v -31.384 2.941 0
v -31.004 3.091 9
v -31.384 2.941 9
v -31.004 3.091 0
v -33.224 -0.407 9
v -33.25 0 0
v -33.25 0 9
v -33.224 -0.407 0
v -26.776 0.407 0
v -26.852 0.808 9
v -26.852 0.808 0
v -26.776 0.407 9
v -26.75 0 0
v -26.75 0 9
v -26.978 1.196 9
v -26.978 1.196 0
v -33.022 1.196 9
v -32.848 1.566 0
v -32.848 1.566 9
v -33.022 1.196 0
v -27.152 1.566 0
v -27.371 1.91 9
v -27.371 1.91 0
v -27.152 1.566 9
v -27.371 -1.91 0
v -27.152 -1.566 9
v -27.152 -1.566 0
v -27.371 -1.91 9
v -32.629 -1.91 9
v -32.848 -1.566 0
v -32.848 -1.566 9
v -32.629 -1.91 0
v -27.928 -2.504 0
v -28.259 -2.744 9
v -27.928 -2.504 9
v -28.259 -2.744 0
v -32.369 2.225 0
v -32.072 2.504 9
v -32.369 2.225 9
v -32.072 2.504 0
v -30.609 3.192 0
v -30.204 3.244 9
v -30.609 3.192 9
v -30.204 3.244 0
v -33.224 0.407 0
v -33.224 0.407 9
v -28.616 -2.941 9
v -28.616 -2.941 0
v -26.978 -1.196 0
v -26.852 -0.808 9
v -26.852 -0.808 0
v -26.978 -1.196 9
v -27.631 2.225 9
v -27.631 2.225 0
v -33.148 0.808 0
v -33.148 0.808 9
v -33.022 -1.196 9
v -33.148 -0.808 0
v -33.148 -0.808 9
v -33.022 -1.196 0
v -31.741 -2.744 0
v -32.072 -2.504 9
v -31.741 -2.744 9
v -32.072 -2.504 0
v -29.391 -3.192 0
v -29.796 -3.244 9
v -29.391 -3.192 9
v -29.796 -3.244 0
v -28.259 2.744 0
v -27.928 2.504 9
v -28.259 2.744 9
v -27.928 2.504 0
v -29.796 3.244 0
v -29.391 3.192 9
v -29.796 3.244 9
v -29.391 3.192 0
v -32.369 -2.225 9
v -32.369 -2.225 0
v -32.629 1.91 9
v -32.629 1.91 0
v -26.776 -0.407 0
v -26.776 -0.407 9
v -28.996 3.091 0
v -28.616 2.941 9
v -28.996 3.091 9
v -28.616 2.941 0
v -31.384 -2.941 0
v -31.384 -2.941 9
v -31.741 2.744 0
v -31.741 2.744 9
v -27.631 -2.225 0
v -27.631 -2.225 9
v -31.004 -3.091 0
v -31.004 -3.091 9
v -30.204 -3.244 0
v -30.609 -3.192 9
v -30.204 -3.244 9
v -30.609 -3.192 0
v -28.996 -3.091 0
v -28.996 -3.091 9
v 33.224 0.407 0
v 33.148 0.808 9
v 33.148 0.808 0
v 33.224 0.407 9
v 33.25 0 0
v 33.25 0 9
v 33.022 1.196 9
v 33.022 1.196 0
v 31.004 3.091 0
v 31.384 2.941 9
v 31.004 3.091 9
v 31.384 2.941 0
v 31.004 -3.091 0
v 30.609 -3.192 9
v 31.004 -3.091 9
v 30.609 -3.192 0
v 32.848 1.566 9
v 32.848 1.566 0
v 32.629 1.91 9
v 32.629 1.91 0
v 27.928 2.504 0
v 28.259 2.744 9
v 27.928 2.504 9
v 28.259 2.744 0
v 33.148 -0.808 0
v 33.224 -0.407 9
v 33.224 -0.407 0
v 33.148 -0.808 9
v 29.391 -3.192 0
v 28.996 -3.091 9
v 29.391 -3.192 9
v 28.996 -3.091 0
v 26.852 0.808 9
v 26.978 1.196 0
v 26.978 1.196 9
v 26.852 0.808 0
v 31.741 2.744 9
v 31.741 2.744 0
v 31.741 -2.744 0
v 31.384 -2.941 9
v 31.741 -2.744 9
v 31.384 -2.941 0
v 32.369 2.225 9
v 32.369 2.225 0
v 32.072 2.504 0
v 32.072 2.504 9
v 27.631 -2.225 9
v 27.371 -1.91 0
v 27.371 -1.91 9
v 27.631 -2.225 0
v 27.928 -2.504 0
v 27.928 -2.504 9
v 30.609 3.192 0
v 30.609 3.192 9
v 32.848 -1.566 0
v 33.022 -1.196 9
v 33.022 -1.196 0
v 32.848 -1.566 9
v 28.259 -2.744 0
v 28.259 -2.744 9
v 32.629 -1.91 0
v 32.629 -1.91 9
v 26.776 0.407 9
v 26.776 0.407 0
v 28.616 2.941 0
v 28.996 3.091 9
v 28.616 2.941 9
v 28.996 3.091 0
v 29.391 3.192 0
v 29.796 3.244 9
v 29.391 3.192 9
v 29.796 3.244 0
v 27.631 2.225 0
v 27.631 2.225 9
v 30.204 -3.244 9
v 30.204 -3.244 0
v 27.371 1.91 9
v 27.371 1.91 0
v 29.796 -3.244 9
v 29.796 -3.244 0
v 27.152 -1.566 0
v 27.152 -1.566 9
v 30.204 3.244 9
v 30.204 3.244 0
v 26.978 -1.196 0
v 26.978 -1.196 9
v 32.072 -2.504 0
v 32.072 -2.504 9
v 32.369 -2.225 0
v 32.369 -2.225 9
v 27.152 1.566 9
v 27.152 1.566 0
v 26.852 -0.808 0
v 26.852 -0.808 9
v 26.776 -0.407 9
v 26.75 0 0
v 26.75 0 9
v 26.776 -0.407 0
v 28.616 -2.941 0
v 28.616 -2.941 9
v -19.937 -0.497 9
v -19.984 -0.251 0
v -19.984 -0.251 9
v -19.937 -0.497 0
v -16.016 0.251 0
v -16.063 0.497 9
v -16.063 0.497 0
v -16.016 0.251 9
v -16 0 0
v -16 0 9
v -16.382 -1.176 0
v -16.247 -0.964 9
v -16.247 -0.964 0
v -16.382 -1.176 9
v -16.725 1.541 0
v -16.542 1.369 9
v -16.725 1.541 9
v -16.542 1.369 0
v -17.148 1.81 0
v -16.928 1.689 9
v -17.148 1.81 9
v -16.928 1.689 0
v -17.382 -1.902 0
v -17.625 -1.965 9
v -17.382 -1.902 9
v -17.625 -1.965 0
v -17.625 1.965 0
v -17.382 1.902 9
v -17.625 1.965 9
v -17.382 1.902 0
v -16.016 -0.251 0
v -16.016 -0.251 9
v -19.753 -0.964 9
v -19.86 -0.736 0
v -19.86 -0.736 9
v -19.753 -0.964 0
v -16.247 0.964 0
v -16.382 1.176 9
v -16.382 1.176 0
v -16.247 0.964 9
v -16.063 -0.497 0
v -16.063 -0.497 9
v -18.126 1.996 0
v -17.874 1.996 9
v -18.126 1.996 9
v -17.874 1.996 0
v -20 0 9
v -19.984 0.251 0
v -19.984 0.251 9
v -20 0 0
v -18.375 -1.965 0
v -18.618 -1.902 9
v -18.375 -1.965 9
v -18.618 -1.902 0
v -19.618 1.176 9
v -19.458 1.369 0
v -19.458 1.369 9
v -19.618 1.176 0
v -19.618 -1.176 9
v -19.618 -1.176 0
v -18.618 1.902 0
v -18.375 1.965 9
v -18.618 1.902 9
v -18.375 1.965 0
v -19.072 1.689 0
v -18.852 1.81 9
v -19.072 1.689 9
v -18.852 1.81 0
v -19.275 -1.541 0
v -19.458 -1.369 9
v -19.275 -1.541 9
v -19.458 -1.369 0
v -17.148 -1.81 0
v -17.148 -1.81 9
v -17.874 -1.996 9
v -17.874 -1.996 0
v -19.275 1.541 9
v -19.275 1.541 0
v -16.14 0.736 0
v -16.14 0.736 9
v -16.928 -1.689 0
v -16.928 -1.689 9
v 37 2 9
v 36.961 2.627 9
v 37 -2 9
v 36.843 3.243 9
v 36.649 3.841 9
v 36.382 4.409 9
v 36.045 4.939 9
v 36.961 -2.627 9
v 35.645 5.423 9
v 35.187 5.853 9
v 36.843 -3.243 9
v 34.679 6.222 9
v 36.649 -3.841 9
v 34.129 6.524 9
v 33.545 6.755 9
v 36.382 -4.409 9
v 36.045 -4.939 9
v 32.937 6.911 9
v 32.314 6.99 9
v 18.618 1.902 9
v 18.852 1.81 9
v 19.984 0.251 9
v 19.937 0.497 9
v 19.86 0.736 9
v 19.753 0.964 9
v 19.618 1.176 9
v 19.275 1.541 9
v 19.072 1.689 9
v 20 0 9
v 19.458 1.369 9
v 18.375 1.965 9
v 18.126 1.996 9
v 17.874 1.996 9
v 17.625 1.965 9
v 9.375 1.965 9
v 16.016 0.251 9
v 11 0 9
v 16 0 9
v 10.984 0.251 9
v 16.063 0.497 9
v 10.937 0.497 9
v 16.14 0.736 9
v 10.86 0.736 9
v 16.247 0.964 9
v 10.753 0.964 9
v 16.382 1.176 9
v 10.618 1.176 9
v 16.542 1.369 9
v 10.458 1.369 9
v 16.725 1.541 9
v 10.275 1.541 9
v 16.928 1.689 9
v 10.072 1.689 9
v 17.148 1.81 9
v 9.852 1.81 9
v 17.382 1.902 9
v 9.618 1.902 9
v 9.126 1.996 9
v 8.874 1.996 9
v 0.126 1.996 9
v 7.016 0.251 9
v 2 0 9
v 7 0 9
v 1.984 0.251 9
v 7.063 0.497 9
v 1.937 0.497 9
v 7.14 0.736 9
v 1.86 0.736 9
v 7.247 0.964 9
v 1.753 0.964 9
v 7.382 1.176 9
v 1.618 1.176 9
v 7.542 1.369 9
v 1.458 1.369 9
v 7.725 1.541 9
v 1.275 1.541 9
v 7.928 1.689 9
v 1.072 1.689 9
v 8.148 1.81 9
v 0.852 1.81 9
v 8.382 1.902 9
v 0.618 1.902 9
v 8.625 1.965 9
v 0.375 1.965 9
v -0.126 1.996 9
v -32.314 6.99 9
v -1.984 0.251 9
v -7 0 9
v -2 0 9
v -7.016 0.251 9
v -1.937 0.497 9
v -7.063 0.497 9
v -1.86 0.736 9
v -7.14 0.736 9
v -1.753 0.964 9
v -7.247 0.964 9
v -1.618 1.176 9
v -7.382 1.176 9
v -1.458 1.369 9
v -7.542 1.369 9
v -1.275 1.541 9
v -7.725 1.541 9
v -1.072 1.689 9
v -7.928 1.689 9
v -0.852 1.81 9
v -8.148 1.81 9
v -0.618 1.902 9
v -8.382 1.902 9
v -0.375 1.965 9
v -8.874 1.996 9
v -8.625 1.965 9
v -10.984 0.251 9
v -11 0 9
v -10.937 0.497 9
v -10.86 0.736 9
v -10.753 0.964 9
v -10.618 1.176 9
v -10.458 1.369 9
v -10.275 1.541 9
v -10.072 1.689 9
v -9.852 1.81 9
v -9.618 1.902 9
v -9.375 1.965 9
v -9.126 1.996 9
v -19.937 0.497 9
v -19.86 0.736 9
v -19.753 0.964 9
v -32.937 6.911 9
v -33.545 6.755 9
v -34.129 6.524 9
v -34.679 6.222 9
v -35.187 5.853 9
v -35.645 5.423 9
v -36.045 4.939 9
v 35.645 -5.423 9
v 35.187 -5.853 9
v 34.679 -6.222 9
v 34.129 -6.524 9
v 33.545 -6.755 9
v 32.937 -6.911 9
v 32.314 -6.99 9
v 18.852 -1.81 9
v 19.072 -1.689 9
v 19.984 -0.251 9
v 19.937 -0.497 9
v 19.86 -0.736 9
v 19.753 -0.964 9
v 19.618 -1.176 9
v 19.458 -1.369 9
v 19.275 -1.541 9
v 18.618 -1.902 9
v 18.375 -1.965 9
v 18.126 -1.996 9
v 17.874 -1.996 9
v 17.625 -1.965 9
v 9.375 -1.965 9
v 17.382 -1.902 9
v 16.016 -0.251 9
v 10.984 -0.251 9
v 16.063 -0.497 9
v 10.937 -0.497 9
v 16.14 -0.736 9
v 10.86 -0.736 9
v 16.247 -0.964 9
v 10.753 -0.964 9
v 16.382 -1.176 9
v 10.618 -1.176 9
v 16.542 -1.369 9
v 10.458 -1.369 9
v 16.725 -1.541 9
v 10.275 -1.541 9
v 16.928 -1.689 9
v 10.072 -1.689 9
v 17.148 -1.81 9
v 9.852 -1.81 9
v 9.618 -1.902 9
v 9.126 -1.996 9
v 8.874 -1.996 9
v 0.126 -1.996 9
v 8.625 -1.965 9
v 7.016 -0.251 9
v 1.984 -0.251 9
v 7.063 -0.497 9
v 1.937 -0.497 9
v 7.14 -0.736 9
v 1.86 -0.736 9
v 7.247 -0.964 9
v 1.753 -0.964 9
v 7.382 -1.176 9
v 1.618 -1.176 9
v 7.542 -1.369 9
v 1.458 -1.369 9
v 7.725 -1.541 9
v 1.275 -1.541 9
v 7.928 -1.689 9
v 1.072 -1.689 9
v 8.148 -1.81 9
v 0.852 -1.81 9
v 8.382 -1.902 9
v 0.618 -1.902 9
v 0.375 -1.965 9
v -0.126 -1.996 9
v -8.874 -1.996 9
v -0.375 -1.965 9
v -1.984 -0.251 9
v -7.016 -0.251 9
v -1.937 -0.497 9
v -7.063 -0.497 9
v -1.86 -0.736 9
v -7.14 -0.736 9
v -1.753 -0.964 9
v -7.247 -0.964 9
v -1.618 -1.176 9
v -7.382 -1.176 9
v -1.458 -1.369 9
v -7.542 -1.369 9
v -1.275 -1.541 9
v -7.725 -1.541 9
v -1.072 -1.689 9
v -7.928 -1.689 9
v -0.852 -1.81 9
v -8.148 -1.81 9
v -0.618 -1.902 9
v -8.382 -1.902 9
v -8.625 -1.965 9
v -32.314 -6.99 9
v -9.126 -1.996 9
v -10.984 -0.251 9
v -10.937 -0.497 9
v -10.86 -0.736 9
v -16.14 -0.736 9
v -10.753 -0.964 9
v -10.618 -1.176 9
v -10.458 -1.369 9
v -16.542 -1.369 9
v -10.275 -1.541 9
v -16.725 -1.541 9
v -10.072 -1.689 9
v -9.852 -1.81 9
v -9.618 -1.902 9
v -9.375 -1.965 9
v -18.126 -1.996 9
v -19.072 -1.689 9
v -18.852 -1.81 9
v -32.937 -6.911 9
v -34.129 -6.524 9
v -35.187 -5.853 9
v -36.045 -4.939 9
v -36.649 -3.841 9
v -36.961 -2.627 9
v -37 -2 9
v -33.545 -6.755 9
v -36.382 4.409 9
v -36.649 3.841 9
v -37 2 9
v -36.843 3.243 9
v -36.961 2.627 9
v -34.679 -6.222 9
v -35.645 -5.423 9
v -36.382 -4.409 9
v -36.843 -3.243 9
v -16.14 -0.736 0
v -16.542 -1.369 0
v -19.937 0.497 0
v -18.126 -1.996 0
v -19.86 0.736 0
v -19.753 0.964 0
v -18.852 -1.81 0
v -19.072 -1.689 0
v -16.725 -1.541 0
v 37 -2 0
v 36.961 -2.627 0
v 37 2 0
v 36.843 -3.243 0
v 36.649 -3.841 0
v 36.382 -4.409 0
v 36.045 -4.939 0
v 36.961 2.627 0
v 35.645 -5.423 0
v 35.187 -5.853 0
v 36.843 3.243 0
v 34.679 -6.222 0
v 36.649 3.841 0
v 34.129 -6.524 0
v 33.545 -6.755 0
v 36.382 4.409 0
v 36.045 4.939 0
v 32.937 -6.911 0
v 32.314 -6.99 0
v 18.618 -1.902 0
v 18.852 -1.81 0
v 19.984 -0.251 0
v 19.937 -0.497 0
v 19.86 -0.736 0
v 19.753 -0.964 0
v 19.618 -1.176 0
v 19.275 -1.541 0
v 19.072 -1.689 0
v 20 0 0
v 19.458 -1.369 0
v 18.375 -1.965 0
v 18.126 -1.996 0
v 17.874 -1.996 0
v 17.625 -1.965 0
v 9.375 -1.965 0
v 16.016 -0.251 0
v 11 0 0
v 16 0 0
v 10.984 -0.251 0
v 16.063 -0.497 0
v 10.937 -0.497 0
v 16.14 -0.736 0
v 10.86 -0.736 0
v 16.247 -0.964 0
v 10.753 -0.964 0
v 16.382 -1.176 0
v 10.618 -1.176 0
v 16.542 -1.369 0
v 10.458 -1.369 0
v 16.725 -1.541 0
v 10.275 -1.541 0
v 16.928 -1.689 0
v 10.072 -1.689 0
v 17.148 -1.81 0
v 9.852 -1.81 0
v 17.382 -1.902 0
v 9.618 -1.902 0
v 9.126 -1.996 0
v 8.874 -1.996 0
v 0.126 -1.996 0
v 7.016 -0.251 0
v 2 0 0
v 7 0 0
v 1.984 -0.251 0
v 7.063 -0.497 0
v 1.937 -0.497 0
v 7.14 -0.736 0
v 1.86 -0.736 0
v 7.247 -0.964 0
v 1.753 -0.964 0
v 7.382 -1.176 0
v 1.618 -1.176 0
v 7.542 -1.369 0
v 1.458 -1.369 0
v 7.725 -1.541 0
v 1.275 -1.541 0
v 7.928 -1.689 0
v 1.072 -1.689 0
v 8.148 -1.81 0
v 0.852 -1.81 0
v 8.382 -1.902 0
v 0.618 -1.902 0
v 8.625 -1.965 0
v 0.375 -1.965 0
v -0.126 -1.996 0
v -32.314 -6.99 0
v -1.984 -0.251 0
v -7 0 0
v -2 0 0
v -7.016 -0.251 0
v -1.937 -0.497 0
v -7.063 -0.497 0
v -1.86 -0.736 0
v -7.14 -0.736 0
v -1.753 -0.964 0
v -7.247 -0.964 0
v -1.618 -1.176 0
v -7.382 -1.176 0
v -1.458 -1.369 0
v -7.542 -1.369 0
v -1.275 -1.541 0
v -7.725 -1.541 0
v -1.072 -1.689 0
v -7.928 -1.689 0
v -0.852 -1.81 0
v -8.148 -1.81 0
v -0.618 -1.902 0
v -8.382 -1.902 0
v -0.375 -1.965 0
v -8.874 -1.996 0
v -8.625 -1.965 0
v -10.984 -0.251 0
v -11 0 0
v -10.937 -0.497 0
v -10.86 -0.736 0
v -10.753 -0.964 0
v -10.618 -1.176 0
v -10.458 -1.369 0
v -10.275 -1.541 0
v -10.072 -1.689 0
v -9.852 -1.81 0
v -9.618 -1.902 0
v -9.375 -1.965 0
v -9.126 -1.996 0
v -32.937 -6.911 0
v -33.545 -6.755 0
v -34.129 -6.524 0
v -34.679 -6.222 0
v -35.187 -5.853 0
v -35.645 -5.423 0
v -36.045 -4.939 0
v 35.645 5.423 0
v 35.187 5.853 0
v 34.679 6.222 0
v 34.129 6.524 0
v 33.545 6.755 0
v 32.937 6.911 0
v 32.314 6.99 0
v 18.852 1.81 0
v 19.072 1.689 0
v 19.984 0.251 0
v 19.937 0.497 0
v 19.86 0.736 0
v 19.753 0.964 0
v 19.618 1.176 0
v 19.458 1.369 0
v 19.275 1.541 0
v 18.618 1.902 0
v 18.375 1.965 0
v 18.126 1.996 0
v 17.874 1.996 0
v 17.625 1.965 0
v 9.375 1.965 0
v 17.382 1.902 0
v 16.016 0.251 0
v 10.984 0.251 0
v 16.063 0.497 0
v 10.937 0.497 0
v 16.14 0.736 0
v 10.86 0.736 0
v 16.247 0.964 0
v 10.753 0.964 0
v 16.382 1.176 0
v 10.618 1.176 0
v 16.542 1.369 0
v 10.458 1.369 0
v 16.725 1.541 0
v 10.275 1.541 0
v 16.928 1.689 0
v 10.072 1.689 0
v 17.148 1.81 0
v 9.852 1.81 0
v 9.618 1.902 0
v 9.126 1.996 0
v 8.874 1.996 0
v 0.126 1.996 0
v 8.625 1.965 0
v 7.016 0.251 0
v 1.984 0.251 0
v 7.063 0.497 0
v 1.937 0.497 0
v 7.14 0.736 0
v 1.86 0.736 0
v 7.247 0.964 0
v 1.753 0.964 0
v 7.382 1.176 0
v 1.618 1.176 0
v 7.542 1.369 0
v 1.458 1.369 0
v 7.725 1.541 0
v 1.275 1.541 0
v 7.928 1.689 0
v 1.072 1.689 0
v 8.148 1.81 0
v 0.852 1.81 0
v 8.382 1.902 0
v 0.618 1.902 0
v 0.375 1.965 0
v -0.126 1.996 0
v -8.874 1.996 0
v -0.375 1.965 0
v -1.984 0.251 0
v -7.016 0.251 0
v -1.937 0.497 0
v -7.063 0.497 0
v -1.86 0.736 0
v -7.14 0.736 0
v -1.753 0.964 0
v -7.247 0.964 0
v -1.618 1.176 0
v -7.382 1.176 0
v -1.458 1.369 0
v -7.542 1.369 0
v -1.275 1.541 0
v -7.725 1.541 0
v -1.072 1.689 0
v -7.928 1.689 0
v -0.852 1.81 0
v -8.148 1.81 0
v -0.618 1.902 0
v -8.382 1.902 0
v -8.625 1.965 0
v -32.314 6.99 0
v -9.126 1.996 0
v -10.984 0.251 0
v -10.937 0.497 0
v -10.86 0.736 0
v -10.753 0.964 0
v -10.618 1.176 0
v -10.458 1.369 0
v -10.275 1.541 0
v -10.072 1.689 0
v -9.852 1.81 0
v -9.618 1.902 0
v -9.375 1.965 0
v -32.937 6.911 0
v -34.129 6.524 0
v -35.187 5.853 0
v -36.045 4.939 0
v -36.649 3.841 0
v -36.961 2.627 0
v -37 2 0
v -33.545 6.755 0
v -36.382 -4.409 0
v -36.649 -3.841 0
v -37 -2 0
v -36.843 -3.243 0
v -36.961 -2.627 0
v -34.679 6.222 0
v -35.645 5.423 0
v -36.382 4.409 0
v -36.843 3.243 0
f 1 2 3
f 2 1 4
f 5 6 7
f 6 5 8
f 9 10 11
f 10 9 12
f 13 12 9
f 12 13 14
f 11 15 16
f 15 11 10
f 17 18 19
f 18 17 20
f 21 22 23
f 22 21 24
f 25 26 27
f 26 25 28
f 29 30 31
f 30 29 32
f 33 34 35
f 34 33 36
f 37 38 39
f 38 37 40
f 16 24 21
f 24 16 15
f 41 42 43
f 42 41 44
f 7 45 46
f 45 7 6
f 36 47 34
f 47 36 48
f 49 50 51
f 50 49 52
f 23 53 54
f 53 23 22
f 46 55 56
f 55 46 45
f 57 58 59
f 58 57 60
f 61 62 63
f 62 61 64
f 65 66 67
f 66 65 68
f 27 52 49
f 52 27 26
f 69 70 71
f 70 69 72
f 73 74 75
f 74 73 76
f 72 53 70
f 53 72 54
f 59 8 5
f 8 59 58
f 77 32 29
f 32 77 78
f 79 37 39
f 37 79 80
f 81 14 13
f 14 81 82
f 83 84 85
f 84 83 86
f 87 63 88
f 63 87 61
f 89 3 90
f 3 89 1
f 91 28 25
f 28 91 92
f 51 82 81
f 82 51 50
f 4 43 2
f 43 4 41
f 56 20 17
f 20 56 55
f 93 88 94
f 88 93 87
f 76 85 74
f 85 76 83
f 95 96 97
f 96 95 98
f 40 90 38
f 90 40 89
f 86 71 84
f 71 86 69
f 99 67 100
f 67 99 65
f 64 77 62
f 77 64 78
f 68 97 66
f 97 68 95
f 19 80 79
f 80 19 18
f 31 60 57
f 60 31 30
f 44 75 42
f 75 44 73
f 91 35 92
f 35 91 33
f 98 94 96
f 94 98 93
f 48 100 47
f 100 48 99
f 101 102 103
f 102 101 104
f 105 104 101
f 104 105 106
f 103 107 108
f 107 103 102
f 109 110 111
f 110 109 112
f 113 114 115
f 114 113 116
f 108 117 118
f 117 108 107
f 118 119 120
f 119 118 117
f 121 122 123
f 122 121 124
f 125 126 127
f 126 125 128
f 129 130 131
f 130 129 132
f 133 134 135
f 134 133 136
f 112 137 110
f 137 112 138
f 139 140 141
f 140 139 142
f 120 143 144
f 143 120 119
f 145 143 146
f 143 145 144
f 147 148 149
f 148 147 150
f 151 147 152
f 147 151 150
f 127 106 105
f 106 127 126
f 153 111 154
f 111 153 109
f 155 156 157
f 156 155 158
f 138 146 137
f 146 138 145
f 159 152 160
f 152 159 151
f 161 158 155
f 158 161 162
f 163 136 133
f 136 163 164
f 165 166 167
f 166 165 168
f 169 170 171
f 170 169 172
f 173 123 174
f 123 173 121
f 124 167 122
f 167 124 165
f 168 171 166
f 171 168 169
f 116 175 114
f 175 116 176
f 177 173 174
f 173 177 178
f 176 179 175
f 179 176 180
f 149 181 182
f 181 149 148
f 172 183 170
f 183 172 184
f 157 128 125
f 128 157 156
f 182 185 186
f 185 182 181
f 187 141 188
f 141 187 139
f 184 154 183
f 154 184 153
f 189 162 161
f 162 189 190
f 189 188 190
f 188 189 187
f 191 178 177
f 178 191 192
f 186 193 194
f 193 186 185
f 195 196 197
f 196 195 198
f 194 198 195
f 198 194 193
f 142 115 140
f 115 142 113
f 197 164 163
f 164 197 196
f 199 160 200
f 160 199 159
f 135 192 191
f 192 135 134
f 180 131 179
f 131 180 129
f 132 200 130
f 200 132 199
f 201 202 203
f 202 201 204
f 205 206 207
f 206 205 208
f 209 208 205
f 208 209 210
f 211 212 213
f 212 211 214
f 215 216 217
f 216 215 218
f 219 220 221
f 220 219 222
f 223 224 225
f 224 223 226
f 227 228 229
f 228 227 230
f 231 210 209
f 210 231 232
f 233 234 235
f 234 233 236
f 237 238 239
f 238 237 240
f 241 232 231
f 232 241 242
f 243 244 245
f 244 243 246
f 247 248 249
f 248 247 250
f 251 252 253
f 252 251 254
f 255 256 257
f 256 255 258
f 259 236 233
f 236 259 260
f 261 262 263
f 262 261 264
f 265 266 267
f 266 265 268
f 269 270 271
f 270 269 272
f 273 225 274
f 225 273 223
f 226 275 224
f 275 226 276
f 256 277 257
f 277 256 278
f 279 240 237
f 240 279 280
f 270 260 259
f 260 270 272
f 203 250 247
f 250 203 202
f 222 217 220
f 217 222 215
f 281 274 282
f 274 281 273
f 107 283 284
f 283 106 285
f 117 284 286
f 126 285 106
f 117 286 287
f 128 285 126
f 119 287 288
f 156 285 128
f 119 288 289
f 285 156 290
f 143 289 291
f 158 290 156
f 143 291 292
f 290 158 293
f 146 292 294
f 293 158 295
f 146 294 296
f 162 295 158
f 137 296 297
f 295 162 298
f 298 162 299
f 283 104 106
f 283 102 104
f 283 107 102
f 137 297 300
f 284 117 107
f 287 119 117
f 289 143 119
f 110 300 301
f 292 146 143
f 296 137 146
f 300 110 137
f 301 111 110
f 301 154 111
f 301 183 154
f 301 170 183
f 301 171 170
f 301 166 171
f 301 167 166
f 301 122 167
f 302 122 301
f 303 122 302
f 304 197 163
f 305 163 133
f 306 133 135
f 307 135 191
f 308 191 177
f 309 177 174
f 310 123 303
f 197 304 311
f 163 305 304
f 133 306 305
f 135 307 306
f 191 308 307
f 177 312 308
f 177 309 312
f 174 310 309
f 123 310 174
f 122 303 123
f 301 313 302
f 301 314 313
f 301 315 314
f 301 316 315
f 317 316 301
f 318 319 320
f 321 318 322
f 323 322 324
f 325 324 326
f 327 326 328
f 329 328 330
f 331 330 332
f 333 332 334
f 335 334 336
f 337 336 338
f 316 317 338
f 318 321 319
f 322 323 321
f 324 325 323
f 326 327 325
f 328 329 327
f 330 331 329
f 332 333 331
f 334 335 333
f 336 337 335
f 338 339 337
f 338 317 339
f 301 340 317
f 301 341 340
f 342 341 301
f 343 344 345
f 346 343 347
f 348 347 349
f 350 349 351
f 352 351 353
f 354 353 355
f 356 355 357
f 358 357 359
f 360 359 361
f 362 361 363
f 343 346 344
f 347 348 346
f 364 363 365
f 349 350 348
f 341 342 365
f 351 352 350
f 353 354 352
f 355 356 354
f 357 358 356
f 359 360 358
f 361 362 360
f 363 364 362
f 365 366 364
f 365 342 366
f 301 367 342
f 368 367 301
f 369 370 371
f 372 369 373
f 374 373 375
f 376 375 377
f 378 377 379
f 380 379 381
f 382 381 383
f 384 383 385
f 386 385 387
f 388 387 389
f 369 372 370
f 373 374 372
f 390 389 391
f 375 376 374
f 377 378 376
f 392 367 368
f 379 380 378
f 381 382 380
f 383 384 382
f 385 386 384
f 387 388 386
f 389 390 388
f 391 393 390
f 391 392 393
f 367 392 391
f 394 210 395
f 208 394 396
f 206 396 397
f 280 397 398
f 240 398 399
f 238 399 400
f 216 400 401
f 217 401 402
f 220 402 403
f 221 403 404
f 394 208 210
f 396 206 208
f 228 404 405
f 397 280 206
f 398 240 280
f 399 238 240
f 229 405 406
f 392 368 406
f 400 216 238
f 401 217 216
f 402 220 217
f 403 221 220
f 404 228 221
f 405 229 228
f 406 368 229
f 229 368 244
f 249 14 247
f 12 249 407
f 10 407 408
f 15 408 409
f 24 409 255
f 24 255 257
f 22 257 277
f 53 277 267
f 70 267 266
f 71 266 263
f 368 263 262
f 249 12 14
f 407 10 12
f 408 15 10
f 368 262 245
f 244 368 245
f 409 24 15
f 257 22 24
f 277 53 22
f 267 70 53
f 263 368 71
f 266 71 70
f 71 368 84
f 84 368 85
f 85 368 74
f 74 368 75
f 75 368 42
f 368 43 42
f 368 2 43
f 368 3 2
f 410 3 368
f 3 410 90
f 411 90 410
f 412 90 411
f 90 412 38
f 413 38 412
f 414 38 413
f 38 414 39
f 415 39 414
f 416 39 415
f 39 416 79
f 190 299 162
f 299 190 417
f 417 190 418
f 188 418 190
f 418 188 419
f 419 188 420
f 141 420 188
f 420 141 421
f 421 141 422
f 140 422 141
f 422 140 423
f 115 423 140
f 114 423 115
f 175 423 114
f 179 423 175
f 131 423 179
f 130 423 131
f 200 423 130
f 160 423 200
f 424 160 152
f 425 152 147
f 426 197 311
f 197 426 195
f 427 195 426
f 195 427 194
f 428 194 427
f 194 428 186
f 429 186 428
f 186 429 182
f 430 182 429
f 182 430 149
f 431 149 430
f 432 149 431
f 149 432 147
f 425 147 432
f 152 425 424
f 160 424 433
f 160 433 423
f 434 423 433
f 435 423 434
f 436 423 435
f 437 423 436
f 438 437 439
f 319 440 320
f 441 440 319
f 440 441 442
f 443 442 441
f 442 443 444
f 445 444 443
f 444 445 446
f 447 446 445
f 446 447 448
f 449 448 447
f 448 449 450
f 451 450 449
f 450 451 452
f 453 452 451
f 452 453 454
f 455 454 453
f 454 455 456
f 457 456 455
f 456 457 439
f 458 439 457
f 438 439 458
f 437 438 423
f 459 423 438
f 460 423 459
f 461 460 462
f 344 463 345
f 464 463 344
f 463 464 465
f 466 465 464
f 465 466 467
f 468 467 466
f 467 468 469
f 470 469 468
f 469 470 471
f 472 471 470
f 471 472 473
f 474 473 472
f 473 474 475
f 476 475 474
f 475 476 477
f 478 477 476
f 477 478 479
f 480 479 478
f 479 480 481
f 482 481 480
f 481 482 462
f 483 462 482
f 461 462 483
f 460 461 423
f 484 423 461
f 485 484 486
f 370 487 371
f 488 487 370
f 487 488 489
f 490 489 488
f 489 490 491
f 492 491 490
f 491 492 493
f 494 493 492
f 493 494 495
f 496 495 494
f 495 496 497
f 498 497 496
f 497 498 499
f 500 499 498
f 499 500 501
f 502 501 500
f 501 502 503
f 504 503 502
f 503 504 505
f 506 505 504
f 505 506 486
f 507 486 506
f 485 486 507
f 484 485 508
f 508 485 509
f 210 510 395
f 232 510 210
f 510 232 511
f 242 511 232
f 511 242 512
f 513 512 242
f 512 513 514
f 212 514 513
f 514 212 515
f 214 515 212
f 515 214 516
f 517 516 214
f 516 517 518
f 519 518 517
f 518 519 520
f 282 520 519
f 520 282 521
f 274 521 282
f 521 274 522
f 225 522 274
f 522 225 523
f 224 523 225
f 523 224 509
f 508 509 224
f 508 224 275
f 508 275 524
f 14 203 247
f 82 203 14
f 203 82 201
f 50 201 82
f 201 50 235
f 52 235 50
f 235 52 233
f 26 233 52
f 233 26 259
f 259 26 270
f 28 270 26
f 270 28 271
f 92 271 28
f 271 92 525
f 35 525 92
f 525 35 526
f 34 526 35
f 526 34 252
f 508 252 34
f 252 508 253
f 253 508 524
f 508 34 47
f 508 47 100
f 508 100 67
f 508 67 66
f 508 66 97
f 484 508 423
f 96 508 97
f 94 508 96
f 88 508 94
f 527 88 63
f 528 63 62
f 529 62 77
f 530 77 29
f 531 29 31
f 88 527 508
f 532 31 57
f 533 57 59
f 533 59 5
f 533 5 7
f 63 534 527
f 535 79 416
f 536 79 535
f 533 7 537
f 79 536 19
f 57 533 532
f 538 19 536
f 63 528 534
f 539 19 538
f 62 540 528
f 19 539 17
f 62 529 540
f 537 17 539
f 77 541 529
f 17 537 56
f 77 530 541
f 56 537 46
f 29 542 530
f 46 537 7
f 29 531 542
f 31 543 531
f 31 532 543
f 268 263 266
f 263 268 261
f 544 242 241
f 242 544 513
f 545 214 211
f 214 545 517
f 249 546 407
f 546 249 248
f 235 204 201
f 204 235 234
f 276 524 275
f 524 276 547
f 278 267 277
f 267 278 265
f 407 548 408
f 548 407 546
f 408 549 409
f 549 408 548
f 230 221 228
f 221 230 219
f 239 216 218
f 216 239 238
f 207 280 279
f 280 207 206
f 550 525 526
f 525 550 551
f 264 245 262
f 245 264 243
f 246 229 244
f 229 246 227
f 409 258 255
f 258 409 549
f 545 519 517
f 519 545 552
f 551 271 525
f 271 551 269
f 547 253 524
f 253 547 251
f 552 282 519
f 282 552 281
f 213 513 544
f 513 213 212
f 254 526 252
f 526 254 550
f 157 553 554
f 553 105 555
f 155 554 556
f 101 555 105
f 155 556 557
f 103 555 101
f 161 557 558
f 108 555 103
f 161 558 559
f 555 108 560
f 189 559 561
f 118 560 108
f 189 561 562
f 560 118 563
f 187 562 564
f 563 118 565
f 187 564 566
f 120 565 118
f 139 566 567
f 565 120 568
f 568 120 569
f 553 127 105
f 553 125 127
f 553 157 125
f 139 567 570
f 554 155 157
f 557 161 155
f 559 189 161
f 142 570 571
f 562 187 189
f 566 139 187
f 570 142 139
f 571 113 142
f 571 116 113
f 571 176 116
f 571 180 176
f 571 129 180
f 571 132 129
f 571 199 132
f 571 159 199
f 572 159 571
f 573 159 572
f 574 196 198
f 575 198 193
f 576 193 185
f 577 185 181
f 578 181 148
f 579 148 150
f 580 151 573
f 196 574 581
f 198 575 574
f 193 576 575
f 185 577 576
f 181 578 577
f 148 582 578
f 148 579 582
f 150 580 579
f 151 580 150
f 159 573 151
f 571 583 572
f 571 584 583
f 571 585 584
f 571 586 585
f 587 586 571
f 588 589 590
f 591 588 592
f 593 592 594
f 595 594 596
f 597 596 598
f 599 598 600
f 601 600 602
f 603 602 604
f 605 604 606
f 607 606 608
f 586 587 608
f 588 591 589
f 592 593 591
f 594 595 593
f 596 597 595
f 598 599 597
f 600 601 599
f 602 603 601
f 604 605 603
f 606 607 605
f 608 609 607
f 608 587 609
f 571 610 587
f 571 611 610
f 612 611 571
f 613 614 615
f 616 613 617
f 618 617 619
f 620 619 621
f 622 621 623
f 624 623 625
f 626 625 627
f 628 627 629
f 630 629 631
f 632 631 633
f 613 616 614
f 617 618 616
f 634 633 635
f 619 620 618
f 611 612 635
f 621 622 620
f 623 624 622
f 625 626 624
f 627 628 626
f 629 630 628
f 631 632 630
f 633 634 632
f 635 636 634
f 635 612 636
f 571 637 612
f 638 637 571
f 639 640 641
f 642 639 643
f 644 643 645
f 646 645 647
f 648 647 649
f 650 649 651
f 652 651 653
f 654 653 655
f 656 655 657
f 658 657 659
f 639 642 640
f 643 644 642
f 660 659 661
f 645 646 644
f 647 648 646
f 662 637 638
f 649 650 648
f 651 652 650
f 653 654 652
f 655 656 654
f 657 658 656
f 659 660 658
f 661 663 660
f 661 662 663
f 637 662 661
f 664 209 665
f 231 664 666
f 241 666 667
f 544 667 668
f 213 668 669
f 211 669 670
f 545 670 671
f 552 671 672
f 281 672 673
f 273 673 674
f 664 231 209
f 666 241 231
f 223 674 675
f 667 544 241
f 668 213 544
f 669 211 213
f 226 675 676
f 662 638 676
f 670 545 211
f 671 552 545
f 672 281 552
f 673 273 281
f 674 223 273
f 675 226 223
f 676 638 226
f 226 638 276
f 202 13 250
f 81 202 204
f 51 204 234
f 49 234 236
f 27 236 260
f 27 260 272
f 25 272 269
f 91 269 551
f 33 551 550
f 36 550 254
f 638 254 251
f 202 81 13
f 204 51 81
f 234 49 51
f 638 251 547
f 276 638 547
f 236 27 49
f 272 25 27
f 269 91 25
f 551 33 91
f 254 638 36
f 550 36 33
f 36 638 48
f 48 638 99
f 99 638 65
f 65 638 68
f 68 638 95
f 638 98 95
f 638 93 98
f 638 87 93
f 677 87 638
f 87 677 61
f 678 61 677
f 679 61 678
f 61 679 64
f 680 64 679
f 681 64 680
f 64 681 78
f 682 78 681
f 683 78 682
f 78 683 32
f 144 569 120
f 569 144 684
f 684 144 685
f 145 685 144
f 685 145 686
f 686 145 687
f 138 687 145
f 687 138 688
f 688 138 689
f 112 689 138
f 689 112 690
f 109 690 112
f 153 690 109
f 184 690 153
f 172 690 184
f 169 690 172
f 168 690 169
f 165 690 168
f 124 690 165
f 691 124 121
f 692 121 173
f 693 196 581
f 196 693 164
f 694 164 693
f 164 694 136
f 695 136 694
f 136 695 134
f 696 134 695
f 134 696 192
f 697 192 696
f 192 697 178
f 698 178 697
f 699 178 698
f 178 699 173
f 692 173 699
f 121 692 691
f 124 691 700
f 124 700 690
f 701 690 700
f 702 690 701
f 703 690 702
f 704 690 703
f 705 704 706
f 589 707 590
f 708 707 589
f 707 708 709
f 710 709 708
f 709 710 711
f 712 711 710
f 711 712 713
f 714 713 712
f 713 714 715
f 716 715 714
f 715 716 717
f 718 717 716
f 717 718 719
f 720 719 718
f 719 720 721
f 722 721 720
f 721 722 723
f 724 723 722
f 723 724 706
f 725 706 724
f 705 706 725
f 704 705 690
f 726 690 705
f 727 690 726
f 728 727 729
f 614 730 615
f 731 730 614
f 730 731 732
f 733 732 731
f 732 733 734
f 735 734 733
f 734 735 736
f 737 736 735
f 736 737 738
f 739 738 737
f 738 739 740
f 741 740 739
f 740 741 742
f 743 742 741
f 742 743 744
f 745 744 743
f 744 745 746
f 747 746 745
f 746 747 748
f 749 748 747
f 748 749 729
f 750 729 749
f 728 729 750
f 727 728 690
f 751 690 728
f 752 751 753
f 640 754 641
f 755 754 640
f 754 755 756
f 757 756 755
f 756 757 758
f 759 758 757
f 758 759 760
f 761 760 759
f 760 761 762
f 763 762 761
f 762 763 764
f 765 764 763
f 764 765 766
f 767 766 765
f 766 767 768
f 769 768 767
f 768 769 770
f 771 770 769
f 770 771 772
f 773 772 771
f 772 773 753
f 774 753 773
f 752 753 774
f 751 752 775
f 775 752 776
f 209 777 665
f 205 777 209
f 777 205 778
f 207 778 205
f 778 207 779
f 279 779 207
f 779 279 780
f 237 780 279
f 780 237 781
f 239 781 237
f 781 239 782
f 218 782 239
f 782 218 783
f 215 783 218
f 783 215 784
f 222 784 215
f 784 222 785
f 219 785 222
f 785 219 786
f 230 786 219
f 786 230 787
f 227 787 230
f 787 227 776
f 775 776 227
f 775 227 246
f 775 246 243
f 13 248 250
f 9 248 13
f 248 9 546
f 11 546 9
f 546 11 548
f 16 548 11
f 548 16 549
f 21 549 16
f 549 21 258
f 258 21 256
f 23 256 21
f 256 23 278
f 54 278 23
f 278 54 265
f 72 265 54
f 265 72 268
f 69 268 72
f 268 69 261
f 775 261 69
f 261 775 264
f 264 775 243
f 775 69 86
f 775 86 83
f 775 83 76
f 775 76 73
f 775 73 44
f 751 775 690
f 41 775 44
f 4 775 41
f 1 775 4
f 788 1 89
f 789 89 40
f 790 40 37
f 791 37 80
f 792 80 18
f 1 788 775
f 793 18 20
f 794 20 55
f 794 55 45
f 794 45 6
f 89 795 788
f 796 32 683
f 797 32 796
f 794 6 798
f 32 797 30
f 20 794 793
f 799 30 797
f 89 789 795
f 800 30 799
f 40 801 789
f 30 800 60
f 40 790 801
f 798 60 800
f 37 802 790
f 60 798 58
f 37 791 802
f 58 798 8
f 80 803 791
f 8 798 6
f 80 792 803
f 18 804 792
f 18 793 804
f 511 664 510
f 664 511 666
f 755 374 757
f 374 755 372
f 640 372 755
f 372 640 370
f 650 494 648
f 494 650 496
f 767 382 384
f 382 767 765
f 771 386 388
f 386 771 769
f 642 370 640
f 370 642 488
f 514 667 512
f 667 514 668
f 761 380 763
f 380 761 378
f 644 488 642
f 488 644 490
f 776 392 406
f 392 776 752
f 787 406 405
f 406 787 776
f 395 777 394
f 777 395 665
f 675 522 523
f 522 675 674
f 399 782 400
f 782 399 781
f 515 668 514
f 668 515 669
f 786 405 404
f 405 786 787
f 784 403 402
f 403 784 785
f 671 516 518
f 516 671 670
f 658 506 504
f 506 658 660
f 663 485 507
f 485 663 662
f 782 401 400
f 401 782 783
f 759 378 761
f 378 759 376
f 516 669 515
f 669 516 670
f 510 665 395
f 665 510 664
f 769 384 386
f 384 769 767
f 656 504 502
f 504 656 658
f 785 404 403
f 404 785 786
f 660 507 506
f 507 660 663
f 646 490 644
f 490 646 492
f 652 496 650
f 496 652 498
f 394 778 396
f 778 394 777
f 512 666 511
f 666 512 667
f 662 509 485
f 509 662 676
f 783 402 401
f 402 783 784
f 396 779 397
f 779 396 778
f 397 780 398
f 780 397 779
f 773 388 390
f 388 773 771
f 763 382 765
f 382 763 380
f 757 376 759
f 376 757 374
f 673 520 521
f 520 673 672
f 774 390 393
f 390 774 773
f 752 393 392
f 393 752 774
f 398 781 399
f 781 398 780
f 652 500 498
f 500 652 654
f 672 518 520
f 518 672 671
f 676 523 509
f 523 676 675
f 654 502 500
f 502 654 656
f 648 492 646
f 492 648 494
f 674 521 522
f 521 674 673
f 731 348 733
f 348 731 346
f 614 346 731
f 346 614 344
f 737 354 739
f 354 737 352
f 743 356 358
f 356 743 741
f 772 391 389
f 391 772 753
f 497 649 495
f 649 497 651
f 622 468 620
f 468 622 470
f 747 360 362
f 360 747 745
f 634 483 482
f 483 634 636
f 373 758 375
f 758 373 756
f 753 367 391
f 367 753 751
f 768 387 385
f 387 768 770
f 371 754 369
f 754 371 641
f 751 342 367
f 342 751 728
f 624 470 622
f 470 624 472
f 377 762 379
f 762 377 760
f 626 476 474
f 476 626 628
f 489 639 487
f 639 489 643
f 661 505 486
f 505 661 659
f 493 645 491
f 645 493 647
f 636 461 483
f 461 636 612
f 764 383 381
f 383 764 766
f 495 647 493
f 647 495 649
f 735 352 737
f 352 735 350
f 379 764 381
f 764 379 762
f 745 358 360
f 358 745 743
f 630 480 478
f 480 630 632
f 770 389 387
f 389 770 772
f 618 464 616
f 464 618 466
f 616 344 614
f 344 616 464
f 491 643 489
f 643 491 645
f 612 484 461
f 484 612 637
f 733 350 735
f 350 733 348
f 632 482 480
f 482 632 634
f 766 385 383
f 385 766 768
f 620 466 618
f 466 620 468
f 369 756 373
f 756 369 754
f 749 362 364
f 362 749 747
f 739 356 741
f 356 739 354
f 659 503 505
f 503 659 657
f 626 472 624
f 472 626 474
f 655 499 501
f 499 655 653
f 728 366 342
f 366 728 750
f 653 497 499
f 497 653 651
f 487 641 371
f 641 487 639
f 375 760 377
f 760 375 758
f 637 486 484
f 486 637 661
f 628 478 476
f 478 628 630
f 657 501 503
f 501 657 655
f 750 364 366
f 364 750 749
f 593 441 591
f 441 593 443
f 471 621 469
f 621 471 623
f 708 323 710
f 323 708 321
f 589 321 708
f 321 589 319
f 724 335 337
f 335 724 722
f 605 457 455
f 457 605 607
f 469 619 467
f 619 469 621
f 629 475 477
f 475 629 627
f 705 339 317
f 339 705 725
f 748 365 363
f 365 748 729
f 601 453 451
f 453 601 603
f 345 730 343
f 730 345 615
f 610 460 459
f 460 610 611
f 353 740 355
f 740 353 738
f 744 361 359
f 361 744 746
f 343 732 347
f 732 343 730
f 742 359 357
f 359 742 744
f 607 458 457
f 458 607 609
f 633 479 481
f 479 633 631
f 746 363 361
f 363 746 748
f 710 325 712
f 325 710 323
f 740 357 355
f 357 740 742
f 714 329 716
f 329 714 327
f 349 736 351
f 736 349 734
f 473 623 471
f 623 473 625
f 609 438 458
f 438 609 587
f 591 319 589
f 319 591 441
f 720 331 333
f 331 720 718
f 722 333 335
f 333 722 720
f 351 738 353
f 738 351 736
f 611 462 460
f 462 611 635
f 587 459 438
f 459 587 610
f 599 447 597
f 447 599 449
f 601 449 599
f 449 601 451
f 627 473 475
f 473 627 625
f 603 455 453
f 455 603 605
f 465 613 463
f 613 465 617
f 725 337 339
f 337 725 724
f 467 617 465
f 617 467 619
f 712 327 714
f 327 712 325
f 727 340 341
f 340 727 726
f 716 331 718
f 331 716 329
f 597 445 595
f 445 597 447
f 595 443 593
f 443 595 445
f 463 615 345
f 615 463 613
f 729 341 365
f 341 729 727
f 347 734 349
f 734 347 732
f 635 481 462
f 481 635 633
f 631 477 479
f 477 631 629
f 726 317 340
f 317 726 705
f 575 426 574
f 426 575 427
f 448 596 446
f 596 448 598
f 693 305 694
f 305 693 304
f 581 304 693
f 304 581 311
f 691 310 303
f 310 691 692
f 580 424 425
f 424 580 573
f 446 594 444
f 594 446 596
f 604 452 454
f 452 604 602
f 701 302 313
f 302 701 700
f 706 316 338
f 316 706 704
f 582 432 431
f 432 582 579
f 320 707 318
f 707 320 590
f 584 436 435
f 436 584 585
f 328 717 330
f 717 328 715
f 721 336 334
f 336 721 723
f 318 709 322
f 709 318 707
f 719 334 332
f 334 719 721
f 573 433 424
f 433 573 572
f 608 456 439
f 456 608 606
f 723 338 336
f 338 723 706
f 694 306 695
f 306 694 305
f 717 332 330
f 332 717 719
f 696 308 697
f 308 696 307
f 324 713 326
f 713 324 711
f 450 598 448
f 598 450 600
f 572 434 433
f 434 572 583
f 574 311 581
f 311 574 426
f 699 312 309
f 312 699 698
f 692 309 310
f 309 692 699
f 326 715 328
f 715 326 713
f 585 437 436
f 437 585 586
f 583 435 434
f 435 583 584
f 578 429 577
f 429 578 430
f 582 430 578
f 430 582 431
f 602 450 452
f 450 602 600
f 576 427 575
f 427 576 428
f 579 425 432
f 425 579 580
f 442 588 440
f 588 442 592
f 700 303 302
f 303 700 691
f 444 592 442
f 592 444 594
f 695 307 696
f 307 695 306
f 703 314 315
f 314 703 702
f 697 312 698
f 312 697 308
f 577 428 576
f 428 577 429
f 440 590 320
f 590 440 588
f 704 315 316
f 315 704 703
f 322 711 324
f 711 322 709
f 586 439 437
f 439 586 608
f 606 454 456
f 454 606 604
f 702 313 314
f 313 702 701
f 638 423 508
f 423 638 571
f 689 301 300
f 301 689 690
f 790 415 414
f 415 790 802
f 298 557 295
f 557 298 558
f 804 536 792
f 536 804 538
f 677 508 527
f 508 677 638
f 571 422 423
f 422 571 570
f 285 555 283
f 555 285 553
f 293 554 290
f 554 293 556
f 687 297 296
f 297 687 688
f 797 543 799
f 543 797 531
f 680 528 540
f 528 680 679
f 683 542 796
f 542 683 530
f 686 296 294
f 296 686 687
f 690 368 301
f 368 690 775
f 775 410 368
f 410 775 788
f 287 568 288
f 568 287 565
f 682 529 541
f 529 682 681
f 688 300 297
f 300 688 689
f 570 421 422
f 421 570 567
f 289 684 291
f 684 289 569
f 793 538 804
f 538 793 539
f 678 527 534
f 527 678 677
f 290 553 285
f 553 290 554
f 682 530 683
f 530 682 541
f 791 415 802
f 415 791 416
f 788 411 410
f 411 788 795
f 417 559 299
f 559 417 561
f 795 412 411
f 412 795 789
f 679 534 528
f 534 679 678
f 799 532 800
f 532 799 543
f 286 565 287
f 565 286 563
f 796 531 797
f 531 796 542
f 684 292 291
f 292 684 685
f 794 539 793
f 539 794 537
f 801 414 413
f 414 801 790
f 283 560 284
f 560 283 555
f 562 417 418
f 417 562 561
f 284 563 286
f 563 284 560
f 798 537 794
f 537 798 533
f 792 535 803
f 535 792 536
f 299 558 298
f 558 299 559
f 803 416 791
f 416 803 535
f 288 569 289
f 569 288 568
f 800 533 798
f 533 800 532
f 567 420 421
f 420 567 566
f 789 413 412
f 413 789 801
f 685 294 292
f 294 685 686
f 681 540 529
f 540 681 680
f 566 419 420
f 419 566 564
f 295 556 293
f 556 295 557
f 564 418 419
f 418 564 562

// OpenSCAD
$fn = 50;


difference() {
	union() {
		hull() {
			translate(v = [-32.0000000000, 2.0000000000, 0]) {
				cylinder(h = 9, r = 5);
			}
			translate(v = [32.0000000000, 2.0000000000, 0]) {
				cylinder(h = 9, r = 5);
			}
			translate(v = [-32.0000000000, -2.0000000000, 0]) {
				cylinder(h = 9, r = 5);
			}
			translate(v = [32.0000000000, -2.0000000000, 0]) {
				cylinder(h = 9, r = 5);
			}
		}
	}
	union() {
		#translate(v = [-30.0000000000, 0.0000000000, 0]) {
			cylinder(h = 9, r = 3.2500000000);
		}
		#translate(v = [30.0000000000, 0.0000000000, 0]) {
			cylinder(h = 9, r = 3.2500000000);
		}
		#translate(v = [-30.0000000000, 0.0000000000, -100.0000000000]) {
			cylinder(h = 200, r = 3.2500000000);
		}
		#translate(v = [-30.0000000000, 0.0000000000, -100.0000000000]) {
			cylinder(h = 200, r = 3.2500000000);
		}
		#translate(v = [30.0000000000, 0.0000000000, -100.0000000000]) {
			cylinder(h = 200, r = 3.2500000000);
		}
		#translate(v = [30.0000000000, 0.0000000000, -100.0000000000]) {
			cylinder(h = 200, r = 3.2500000000);
		}
		#translate(v = [-30.0000000000, 0.0000000000, 0]) {
			cylinder(h = 9, r = 1.8000000000);
		}
		#translate(v = [30.0000000000, 0.0000000000, 0]) {
			cylinder(h = 9, r = 1.8000000000);
		}
		#translate(v = [-30.0000000000, 0.0000000000, 0]) {
			cylinder(h = 9, r = 1.8000000000);
		}
		#translate(v = [30.0000000000, 0.0000000000, 0]) {
			cylinder(h = 9, r = 1.8000000000);
		}
		#translate(v = [-30.0000000000, 0.0000000000, 0]) {
			cylinder(h = 9, r = 1.8000000000);
		}
		#translate(v = [30.0000000000, 0.0000000000, 0]) {
			cylinder(h = 9, r = 1.8000000000);
		}
		#translate(v = [-18.0000000000, 0, 0]) {
			cylinder(h = 9, r = 2.0000000000);
		}
		#translate(v = [-9.0000000000, 0, 0]) {
			cylinder(h = 9, r = 2.0000000000);
		}
		#cylinder(h = 9, r = 2.0000000000);
		#translate(v = [9.0000000000, 0, 0]) {
			cylinder(h = 9, r = 2.0000000000);
		}
		#translate(v = [18.0000000000, 0, 0]) {
			cylinder(h = 9, r = 2.0000000000);
		}
	}
}
